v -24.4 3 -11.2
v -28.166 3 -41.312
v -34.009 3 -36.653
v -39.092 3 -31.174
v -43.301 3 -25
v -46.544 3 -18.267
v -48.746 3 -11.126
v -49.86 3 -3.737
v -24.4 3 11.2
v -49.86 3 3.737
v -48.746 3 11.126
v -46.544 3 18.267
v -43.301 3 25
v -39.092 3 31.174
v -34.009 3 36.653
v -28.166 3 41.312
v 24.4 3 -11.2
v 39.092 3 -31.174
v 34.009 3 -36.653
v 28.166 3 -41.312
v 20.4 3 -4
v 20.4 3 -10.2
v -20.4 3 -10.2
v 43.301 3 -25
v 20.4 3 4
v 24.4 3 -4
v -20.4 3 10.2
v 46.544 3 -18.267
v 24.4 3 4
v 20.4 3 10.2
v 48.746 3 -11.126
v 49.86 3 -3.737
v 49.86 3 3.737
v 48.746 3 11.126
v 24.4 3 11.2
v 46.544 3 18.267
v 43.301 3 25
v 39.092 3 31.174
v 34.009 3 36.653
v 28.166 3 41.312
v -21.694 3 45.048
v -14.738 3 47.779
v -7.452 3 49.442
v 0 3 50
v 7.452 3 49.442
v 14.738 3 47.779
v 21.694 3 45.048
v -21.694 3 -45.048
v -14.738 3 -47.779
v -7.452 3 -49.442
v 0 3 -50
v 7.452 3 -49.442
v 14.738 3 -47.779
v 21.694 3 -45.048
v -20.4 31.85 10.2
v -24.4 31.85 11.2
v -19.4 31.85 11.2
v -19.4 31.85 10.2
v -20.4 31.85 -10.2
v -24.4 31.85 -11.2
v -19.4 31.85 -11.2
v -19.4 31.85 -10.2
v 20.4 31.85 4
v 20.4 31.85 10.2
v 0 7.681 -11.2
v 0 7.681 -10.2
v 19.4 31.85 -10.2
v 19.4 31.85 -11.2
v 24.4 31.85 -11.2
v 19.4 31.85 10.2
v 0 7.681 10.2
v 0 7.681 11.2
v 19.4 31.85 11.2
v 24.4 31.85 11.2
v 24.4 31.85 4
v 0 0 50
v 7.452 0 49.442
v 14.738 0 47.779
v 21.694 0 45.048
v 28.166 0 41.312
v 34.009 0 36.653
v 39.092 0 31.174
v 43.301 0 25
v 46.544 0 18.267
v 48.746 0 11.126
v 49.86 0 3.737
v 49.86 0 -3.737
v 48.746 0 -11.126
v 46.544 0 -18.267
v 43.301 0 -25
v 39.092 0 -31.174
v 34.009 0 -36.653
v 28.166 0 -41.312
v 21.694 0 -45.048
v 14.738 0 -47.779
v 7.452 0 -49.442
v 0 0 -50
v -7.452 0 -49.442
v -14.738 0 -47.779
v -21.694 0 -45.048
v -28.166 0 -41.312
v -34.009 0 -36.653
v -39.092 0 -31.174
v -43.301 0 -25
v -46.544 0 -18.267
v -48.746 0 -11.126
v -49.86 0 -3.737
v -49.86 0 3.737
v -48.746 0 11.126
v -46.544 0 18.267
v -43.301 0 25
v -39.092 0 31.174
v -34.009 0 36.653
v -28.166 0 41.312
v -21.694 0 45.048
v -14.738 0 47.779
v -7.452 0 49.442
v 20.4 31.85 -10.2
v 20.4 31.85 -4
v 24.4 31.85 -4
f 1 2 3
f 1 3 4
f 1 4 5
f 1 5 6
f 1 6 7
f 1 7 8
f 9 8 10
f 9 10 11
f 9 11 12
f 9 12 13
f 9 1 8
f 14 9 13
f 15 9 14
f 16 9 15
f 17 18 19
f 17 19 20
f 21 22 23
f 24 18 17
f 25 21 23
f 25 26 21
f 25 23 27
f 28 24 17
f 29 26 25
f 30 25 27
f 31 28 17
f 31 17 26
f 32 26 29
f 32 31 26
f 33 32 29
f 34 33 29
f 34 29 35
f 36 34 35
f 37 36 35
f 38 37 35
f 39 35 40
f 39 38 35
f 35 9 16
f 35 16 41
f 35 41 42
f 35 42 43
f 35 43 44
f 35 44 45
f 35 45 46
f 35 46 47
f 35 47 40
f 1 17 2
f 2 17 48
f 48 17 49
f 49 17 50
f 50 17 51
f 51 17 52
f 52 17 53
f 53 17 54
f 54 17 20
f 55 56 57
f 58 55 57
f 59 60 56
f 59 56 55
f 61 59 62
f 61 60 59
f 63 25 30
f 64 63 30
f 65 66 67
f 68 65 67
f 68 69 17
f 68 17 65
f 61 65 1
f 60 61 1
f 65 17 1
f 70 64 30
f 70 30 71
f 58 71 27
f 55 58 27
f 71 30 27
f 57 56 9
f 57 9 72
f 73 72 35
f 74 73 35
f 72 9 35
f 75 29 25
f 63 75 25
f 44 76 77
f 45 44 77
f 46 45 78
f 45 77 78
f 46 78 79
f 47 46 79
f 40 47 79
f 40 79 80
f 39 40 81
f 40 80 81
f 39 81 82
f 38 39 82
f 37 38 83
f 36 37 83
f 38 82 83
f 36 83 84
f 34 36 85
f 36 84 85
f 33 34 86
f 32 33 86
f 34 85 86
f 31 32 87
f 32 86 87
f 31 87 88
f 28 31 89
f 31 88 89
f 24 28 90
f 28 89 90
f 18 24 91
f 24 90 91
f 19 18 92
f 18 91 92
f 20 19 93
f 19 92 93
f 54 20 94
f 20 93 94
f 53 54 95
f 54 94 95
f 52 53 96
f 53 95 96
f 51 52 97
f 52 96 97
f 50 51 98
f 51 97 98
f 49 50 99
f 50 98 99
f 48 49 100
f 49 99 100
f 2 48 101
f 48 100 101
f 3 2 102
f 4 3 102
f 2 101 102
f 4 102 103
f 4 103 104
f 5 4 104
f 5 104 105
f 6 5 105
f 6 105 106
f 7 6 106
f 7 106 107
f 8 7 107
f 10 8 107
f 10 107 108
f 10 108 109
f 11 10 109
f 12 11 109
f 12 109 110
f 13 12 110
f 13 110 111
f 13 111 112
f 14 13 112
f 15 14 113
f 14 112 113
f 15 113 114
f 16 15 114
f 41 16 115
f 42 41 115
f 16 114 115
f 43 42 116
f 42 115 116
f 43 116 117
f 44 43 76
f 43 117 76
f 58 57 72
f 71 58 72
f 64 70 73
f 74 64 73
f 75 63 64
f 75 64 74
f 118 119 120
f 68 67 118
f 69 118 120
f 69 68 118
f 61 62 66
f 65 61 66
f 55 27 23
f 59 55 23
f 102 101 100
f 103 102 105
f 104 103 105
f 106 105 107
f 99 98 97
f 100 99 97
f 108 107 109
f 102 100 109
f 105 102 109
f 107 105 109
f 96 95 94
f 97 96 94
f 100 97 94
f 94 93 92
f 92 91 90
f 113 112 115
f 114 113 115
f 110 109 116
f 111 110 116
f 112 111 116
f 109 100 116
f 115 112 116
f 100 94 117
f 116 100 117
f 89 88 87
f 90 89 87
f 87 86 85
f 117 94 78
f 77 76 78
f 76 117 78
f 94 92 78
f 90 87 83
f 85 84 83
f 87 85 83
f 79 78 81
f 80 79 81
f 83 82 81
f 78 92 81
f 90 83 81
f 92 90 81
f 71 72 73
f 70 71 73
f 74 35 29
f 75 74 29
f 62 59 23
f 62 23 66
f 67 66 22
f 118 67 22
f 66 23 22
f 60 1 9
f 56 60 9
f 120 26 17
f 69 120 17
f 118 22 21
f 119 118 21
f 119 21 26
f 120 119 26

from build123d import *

# Parameters (mm, degrees)
SKIZZE1_R                       = 50
AUFSATZ_LINEAR_AUSTRAGEN1_DEPTH = 3
AUFSATZ_LINEAR_AUSTRAGEN2_DEPTH = 28.85
SCHNITT_LINEAR_AUSTRAGEN1_DEPTH = 28.85


with BuildPart() as part:
    # Skizze1 → Aufsatz-Linear austragen1 (new body)
    with BuildSketch(Plane(origin=(0, 0, 0), x_dir=(1, 0, 0), z_dir=(0, 1, 0))):
        with Locations(Location((0, 0, 0), (0, 0, 270))):
            Circle(SKIZZE1_R)
    extrude(amount=AUFSATZ_LINEAR_AUSTRAGEN1_DEPTH)

    # Skizze2 → Aufsatz-Linear austragen2 (add)
    with BuildSketch(Plane(origin=(0, 3, 0), x_dir=(1, 0, 0), z_dir=(0, 1, 0))):
        Polygon((20.4, 4), (24.4, 4), (24.4, 11.2), (-24.4, 11.2), (-24.4, -11.2), (24.4, -11.2), (24.4, -4), (20.4, -4), (20.4, -10.2), (-20.4, -10.2), (-20.4, 10.2), (20.4, 10.2), align=None)
    extrude(amount=AUFSATZ_LINEAR_AUSTRAGEN2_DEPTH)

    # Skizze3 → Schnitt-Linear austragen1 (cut)
    with BuildSketch(Plane.XY.offset(11.2)):
        Polygon((-19.4, 31.85), (0, 7.681220191), (19.4, 31.85), align=None)
    extrude(amount=-SCHNITT_LINEAR_AUSTRAGEN1_DEPTH, mode=Mode.SUBTRACT)


solid = part.part
